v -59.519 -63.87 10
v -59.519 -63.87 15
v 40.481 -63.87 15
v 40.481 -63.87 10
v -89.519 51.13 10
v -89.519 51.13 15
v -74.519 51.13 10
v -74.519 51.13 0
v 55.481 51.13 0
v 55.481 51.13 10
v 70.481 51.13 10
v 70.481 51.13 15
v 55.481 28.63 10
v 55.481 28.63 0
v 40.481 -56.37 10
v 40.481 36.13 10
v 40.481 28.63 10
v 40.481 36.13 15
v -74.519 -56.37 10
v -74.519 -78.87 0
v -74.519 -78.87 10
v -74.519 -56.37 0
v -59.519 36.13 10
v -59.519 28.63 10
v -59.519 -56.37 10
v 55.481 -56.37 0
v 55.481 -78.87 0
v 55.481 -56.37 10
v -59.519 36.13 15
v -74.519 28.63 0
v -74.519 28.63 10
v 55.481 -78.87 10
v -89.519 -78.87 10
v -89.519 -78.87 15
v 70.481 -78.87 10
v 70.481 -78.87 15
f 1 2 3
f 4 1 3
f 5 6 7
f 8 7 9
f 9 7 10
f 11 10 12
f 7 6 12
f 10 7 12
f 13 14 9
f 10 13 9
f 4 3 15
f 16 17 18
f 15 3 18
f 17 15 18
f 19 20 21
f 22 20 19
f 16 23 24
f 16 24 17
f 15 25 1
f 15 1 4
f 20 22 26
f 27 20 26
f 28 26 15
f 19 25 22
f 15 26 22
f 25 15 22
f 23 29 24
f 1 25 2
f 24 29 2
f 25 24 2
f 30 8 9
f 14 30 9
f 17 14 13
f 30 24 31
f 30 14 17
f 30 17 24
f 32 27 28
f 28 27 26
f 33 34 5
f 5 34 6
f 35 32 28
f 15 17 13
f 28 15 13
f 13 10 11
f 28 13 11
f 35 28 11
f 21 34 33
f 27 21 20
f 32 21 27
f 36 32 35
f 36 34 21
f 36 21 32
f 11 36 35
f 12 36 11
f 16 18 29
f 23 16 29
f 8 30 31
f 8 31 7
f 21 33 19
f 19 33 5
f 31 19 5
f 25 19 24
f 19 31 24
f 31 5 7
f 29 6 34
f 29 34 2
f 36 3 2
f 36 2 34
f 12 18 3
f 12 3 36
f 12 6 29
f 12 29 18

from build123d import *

# Parameters (mm, degrees)
SKETCH1_W           = 130
SKETCH1_H           = 130
BOSS_EXTRUDE1_DEPTH = 15
SKETCH2_W           = 15
SKETCH2_H           = 130
BOSS_EXTRUDE2_DEPTH = 5
CUT_EXTRUDE2_DEPTH  = 5
CUT_EXTRUDE3_DEPTH  = 120.725284495
SKETCH8_W           = 27
SKETCH8_H           = 85
CUT_EXTRUDE5_DEPTH  = 10


with BuildPart() as part:
    # Sketch1 → Boss-Extrude1 (new body)
    with BuildSketch(Plane.XY):
        with Locations((-9.518828452, -13.870292887)):
            Rectangle(SKETCH1_W, SKETCH1_H)
    extrude(amount=BOSS_EXTRUDE1_DEPTH)

    # Sketch2 → Boss-Extrude2 (add)
    with BuildSketch(Plane.XY.offset(15)):
        with Locations((62.981171548, -13.870292887)):
            Rectangle(SKETCH2_W, SKETCH2_H)
        with Locations((-82.018828452, -13.870292887)):
            Rectangle(SKETCH2_W, SKETCH2_H)
    extrude(amount=-BOSS_EXTRUDE2_DEPTH)

    # Sketch3 → Cut-Extrude2 (cut)
    with BuildSketch(Plane.XY.offset(15)):
        Polygon((-9.518828452, -13.870292887), (-59.518828452, 26.754707113), (-59.518828452, -54.495292887), align=None)
        Polygon((-59.518828452, 36.129707113), (-59.518828452, 26.754707113), (-9.518828452, -13.870292887), (40.481171548, 26.754707113), (40.481171548, 36.129707113), align=None)
        Polygon((40.481171548, -54.495292887), (-9.518828452, -13.870292887), (-59.518828452, -54.495292887), (-59.518828452, -63.870292887), (40.481171548, -63.870292887), align=None)
        Polygon((40.481171548, 26.754707113), (-9.518828452, -13.870292887), (40.481171548, -54.495292887), align=None)
    extrude(amount=-CUT_EXTRUDE2_DEPTH, mode=Mode.SUBTRACT)

    # Sketch5 → Cut-Extrude3 (cut, through all)
    with BuildSketch(Plane.XY.offset(10)):
        Polygon((-47.518828452, 24.129707113), (-47.518828452, -51.870292887), (-9.518828452, -13.870292887), align=None)
        Polygon((-47.518828452, 24.129707113), (-9.518828452, -13.870292887), (28.481171548, 24.129707113), (28.481171548, 28.629707113), (-47.518828452, 28.629707113), align=None)
        Polygon((28.481171548, 24.129707113), (-9.518828452, -13.870292887), (28.481171548, -51.870292887), align=None)
        Polygon((-9.518828452, -13.870292887), (-47.518828452, -51.870292887), (-47.518828452, -56.370292887), (28.481171548, -56.370292887), (28.481171548, -51.870292887), align=None)
    extrude(amount=-CUT_EXTRUDE3_DEPTH, mode=Mode.SUBTRACT)

    # Sketch8 → Cut-Extrude5 (cut)
    with BuildSketch(Plane(origin=(0, 0, 0), x_dir=(-1, 0, 0), z_dir=(0, 0, -1))):
        with Locations((61.018828452, -13.870292887)):
            Rectangle(SKETCH8_W, SKETCH8_H)
        with Locations((-41.981171548, -13.870292887)):
            Rectangle(SKETCH8_W, SKETCH8_H)
    extrude(amount=-CUT_EXTRUDE5_DEPTH, mode=Mode.SUBTRACT)


solid = part.part
